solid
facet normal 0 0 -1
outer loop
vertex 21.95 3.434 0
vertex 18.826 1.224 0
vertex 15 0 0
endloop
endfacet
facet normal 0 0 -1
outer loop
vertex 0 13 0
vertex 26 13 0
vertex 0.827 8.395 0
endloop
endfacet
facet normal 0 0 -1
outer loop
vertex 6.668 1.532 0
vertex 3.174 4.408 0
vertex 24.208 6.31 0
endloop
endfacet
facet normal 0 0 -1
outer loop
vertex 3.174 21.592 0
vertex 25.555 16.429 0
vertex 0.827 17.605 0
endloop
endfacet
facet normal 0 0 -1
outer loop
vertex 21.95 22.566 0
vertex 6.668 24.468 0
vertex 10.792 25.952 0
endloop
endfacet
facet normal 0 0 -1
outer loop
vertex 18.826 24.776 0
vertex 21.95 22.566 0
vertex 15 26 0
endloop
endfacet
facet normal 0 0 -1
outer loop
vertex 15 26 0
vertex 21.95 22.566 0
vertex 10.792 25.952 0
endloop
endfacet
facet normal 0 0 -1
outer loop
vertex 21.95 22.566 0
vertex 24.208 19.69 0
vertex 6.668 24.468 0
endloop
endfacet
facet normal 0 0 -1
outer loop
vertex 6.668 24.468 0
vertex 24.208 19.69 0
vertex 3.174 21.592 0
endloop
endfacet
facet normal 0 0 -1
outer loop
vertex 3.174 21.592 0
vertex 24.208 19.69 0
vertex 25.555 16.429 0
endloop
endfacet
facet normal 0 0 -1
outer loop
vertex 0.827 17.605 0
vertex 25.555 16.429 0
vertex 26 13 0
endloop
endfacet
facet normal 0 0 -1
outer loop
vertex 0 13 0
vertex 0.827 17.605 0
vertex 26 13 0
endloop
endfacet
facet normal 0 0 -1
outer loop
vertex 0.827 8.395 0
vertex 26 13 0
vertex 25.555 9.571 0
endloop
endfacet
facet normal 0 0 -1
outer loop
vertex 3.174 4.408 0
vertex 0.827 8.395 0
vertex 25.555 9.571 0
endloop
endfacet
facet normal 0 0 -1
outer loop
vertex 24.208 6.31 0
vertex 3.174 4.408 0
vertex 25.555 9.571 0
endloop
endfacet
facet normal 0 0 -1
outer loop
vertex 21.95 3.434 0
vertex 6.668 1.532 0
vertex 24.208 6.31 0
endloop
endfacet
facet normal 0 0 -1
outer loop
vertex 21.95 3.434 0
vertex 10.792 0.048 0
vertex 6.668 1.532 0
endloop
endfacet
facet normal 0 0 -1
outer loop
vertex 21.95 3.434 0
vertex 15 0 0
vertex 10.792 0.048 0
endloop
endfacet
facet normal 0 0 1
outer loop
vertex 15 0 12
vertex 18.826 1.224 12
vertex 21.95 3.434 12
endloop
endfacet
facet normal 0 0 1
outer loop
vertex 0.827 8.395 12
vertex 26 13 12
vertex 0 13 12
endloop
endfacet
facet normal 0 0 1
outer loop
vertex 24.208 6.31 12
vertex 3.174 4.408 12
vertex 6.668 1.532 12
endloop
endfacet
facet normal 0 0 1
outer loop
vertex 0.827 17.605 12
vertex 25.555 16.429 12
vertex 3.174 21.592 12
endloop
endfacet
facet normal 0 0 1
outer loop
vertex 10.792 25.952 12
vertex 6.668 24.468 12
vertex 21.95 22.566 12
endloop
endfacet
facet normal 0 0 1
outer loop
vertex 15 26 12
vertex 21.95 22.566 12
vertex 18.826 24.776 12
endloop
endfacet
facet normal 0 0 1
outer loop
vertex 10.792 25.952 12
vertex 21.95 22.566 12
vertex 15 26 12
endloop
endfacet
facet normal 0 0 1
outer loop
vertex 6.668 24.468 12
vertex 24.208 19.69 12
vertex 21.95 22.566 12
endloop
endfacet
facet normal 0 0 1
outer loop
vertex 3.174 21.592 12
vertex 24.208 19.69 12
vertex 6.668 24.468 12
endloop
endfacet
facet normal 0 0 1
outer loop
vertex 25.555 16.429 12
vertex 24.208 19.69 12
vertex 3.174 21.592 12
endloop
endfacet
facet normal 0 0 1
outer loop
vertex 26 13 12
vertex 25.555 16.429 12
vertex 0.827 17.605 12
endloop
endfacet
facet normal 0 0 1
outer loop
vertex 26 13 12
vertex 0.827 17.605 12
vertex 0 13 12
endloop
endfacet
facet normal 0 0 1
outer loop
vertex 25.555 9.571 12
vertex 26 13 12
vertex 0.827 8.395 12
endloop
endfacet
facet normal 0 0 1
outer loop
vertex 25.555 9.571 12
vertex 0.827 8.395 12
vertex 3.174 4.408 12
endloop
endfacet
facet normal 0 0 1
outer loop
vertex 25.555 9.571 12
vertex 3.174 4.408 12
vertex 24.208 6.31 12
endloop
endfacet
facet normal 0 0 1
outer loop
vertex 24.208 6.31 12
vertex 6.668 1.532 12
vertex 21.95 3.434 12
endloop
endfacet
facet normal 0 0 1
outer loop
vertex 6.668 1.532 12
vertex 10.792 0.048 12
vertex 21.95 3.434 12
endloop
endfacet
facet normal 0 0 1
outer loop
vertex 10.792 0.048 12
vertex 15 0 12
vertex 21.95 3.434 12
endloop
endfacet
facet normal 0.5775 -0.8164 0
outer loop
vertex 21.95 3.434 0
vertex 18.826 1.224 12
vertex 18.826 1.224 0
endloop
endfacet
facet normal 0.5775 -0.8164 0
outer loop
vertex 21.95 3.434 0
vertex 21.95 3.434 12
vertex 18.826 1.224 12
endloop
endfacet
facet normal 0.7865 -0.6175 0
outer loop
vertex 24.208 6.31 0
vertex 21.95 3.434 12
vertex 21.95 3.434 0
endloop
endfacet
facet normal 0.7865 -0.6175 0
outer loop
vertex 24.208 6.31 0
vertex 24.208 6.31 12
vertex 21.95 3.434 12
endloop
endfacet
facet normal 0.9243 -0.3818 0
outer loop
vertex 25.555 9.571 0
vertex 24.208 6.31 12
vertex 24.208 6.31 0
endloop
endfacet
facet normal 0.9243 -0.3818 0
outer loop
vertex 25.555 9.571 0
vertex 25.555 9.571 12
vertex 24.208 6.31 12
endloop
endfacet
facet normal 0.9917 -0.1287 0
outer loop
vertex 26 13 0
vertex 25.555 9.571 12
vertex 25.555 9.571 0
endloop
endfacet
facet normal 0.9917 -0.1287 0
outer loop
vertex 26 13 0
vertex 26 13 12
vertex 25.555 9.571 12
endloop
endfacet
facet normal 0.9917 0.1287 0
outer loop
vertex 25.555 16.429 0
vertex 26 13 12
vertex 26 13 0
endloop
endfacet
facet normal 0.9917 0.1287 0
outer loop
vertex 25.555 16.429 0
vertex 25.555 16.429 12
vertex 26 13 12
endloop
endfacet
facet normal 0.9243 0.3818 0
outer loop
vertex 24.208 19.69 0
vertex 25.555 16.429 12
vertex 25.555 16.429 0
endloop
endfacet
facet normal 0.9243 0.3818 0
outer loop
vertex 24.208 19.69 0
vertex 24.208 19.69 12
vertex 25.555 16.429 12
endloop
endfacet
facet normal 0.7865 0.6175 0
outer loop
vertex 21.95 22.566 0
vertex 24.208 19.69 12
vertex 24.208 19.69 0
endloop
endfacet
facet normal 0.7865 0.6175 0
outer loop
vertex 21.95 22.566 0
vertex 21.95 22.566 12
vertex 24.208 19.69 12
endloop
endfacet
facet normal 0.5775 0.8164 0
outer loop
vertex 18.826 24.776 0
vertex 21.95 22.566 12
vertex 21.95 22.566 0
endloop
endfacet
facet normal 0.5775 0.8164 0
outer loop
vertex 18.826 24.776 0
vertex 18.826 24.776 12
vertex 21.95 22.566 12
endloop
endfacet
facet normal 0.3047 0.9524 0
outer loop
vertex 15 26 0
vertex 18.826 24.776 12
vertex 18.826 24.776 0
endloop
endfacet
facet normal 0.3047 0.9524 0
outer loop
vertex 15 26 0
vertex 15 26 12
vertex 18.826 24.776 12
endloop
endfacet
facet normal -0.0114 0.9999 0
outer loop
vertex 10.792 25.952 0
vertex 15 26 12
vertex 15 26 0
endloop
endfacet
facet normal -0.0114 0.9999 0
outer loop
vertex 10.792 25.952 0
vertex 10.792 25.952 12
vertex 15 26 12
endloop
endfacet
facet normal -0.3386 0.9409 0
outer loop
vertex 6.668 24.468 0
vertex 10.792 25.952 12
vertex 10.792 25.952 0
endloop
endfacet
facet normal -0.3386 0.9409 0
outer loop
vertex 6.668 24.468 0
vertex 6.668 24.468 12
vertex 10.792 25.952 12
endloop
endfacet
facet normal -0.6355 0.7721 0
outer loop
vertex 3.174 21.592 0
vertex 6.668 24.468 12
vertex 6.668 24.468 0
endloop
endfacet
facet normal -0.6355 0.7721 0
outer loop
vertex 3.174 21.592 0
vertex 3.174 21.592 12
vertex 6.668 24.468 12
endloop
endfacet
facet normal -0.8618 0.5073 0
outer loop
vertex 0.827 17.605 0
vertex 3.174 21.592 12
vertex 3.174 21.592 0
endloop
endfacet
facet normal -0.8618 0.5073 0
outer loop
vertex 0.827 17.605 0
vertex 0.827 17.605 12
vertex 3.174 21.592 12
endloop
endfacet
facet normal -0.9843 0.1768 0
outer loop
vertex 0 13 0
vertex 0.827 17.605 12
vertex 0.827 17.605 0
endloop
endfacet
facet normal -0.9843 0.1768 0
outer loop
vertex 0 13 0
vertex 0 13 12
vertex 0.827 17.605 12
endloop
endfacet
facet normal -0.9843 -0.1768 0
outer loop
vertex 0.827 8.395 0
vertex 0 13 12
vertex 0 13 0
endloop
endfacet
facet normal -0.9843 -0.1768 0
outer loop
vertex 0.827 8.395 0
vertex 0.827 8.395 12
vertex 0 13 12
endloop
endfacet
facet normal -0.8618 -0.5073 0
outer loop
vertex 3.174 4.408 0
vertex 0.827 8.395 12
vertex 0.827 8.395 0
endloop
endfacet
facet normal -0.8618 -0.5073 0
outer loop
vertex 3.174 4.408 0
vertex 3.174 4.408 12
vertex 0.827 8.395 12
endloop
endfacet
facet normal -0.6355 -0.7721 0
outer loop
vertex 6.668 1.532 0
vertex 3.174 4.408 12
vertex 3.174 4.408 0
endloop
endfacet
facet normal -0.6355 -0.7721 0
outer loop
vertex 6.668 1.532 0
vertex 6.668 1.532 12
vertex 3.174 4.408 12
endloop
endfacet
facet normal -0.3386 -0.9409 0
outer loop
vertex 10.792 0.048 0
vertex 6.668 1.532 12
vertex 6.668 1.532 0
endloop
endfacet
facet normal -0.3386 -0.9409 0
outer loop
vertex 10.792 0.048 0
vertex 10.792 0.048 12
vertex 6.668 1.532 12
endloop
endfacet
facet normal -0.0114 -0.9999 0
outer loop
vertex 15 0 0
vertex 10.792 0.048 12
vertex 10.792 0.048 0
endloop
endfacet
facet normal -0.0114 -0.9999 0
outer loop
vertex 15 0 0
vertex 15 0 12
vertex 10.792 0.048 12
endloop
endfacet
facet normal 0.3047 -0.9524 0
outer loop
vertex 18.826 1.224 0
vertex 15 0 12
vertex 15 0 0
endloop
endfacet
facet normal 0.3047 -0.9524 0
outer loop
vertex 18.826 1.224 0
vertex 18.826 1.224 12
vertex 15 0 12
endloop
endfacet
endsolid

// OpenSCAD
$fn = 32;

// ----------------------------------------------------------------------
// Cam disc: base radius 11.0 mm, lift 4.0 mm, 20 profile points
// ----------------------------------------------------------------------

// --- parameters (mm) ---
profile_height = 12;      // extrusion height
profile_points = 20;      // points of the closed outline

profile = [[26, 13], [25.555, 16.429], [24.208, 19.69], [21.95, 22.566], [18.826, 24.776], [15, 26], [10.792, 25.952], [6.668, 24.468], [3.174, 21.592], [0.827, 17.605], [0, 13], [0.827, 8.395], [3.174, 4.408], [6.668, 1.532], [10.792, 0.048], [15, 0], [18.826, 1.224], [21.95, 3.434], [24.208, 6.31], [25.555, 9.571]];  // single closed polygon, 20 points, counter clockwise

// --- the one profile operation ---
linear_extrude(height = profile_height) polygon(points = profile);
